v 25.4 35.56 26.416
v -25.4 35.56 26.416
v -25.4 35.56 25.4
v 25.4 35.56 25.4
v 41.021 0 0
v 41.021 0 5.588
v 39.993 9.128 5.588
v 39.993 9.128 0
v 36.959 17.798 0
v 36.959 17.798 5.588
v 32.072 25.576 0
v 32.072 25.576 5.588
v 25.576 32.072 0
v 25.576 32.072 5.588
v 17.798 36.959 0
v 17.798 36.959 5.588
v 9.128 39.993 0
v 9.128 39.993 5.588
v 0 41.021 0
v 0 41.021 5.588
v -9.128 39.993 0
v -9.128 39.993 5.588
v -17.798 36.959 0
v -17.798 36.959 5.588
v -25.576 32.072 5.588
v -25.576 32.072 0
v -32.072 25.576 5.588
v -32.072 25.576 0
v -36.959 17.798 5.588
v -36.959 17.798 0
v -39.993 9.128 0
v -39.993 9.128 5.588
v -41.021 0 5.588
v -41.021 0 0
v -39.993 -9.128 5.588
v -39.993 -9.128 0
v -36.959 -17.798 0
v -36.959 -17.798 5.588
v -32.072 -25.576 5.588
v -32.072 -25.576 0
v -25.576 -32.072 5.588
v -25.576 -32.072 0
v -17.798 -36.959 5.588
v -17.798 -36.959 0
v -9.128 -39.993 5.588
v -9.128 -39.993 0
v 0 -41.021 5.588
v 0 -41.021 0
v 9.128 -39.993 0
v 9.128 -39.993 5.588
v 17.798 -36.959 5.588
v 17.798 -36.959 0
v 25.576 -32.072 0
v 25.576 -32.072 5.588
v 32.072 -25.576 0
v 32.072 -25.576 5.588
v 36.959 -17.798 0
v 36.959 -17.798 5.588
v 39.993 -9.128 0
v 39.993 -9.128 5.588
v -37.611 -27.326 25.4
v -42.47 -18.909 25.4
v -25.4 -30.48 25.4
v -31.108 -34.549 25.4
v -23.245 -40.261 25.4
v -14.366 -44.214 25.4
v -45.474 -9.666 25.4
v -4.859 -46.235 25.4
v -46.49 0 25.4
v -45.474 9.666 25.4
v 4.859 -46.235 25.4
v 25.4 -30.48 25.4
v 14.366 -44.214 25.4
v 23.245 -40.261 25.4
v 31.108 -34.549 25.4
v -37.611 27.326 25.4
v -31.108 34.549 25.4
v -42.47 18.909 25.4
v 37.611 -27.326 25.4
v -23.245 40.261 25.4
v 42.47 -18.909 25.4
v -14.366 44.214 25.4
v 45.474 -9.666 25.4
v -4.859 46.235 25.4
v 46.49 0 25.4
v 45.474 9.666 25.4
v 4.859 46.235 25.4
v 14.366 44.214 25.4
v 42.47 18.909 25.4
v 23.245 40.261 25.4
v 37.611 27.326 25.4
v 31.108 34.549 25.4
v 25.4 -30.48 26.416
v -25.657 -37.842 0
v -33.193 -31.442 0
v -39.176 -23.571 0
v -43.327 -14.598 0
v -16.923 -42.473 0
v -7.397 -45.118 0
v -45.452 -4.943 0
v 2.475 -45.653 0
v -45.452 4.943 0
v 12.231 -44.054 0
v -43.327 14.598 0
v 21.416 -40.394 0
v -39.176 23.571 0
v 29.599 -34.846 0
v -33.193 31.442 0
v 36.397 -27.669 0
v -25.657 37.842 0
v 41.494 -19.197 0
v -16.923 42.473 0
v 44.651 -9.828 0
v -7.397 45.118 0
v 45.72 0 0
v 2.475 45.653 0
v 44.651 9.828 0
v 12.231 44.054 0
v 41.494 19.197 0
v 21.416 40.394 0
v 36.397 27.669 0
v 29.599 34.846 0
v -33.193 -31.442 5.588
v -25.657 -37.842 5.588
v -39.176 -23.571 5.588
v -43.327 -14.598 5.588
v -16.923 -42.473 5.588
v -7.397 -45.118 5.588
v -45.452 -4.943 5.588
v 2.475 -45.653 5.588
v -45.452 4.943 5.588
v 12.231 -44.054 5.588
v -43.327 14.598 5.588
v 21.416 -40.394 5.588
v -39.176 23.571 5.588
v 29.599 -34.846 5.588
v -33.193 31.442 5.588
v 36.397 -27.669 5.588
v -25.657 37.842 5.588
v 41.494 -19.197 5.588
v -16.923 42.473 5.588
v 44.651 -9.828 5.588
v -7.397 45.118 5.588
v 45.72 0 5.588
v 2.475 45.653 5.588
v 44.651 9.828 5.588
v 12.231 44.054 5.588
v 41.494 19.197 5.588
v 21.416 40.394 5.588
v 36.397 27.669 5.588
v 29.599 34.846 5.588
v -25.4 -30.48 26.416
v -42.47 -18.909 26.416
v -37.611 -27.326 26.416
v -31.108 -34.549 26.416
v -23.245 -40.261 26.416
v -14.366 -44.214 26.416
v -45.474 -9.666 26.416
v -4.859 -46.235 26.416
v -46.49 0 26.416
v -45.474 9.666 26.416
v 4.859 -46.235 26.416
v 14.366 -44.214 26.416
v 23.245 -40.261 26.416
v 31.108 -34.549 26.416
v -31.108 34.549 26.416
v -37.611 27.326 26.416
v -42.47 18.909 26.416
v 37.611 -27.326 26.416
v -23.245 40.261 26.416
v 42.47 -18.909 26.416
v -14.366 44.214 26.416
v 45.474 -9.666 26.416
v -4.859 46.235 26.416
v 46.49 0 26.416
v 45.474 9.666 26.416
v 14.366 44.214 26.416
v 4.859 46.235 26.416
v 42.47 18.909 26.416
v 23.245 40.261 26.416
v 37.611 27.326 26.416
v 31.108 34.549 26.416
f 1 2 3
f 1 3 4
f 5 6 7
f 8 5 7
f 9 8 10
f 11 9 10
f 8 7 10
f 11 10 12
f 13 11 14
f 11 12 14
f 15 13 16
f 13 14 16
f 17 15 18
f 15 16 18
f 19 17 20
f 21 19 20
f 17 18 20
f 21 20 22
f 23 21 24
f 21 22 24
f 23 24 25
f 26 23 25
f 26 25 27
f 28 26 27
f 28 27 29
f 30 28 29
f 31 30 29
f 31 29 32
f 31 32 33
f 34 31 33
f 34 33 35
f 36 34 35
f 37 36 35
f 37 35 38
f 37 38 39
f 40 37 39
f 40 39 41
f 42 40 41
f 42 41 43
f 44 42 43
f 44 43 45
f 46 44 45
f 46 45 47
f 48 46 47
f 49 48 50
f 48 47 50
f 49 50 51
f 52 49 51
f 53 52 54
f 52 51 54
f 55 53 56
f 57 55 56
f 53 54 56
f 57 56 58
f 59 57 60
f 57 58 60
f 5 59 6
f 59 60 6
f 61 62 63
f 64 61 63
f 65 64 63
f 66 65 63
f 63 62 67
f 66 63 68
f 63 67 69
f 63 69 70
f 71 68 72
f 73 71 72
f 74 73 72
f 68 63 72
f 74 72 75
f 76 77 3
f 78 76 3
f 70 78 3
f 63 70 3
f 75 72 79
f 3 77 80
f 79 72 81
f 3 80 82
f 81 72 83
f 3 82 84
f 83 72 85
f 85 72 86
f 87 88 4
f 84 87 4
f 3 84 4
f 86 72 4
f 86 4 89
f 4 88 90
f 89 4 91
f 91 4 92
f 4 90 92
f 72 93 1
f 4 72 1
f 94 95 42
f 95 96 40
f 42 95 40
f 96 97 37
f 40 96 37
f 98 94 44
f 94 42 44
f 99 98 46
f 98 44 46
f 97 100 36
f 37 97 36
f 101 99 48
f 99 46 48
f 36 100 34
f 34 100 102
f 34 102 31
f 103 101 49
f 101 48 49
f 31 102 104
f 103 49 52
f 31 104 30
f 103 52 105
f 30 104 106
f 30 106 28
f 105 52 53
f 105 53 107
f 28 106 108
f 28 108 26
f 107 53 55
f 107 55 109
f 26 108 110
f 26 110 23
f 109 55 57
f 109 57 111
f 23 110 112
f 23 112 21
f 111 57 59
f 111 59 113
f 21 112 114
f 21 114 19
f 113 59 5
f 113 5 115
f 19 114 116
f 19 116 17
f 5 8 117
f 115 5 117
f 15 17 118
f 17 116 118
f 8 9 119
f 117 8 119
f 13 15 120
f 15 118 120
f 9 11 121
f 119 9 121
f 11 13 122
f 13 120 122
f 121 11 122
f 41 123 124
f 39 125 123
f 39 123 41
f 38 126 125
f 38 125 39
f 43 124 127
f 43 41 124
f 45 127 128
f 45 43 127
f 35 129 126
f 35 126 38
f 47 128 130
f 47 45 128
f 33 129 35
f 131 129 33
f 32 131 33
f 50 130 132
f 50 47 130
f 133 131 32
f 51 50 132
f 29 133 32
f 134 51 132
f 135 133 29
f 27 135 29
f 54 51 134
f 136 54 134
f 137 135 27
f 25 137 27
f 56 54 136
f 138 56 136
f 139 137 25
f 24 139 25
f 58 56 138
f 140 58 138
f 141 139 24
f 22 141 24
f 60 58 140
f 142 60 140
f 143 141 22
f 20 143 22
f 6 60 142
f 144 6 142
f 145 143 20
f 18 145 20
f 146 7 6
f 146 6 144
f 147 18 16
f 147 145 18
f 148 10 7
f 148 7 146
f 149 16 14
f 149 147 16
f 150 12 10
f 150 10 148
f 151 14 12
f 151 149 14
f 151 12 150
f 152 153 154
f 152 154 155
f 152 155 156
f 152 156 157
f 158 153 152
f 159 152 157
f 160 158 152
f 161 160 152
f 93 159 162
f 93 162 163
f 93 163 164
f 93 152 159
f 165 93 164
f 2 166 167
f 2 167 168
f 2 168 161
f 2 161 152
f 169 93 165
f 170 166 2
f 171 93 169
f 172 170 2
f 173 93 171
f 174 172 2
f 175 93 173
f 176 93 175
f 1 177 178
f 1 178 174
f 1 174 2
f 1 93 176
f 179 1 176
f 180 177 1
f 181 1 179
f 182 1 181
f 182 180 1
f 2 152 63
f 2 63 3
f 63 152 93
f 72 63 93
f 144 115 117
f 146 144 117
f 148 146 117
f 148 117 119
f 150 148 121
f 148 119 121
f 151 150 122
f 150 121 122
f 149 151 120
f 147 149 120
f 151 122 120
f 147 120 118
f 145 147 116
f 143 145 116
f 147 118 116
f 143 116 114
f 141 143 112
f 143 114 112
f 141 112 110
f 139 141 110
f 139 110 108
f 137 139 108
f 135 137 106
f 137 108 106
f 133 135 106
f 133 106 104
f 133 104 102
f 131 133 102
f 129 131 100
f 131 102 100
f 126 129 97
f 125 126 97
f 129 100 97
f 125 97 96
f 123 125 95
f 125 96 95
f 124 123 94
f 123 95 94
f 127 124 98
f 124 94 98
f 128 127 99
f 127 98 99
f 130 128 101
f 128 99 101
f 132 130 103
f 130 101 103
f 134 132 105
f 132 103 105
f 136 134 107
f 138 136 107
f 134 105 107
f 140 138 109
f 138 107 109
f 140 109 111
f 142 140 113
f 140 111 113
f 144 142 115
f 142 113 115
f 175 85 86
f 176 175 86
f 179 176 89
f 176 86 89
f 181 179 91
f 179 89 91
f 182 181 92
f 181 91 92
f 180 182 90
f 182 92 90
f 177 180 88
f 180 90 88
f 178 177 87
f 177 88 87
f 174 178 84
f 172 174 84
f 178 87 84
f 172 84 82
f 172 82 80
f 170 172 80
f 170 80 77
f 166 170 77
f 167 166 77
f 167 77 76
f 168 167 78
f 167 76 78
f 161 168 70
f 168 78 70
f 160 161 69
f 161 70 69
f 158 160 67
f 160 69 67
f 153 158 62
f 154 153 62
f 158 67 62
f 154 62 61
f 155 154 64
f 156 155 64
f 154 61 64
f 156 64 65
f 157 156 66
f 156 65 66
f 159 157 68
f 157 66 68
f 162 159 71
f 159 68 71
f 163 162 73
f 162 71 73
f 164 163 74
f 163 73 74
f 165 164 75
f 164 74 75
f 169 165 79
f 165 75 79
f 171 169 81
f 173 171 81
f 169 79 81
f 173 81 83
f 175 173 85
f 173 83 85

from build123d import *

# Parameters (mm, degrees)
F0_R     = 45.72
F1_DEPTH = 5.588
F2_R     = 41.021
F3_DEPTH = 5.589
F5_R     = 46.489719
F6_DEPTH = 1.016
F7_W     = 50.8
F7_H     = 66.04
F8_DEPTH = 12.7


with BuildPart() as f1:
    # F0 (on Top) → F1 (new body)
    with BuildSketch(Plane.XY):
        Circle(F0_R)
    extrude(amount=F1_DEPTH)

    # F2 (on face) → F3 (cut, through all)
    with BuildSketch(Plane.XY.offset(5.588)):
        Circle(F2_R)
    extrude(amount=-F3_DEPTH, mode=Mode.SUBTRACT)


with BuildPart() as f6:
    # F5 (on offset) → F6 (new body)
    with BuildSketch(Plane.XY.offset(25.4)):
        Circle(F5_R)
    extrude(amount=F6_DEPTH)

    # F7 (on face) → F8 (cut)
    with BuildSketch(Plane.XY.offset(26.416)):
        with Locations((0, 2.54)):
            Rectangle(F7_W, F7_H)
    extrude(amount=-F8_DEPTH, mode=Mode.SUBTRACT)


solid = Compound([f1.part, f6.part])
